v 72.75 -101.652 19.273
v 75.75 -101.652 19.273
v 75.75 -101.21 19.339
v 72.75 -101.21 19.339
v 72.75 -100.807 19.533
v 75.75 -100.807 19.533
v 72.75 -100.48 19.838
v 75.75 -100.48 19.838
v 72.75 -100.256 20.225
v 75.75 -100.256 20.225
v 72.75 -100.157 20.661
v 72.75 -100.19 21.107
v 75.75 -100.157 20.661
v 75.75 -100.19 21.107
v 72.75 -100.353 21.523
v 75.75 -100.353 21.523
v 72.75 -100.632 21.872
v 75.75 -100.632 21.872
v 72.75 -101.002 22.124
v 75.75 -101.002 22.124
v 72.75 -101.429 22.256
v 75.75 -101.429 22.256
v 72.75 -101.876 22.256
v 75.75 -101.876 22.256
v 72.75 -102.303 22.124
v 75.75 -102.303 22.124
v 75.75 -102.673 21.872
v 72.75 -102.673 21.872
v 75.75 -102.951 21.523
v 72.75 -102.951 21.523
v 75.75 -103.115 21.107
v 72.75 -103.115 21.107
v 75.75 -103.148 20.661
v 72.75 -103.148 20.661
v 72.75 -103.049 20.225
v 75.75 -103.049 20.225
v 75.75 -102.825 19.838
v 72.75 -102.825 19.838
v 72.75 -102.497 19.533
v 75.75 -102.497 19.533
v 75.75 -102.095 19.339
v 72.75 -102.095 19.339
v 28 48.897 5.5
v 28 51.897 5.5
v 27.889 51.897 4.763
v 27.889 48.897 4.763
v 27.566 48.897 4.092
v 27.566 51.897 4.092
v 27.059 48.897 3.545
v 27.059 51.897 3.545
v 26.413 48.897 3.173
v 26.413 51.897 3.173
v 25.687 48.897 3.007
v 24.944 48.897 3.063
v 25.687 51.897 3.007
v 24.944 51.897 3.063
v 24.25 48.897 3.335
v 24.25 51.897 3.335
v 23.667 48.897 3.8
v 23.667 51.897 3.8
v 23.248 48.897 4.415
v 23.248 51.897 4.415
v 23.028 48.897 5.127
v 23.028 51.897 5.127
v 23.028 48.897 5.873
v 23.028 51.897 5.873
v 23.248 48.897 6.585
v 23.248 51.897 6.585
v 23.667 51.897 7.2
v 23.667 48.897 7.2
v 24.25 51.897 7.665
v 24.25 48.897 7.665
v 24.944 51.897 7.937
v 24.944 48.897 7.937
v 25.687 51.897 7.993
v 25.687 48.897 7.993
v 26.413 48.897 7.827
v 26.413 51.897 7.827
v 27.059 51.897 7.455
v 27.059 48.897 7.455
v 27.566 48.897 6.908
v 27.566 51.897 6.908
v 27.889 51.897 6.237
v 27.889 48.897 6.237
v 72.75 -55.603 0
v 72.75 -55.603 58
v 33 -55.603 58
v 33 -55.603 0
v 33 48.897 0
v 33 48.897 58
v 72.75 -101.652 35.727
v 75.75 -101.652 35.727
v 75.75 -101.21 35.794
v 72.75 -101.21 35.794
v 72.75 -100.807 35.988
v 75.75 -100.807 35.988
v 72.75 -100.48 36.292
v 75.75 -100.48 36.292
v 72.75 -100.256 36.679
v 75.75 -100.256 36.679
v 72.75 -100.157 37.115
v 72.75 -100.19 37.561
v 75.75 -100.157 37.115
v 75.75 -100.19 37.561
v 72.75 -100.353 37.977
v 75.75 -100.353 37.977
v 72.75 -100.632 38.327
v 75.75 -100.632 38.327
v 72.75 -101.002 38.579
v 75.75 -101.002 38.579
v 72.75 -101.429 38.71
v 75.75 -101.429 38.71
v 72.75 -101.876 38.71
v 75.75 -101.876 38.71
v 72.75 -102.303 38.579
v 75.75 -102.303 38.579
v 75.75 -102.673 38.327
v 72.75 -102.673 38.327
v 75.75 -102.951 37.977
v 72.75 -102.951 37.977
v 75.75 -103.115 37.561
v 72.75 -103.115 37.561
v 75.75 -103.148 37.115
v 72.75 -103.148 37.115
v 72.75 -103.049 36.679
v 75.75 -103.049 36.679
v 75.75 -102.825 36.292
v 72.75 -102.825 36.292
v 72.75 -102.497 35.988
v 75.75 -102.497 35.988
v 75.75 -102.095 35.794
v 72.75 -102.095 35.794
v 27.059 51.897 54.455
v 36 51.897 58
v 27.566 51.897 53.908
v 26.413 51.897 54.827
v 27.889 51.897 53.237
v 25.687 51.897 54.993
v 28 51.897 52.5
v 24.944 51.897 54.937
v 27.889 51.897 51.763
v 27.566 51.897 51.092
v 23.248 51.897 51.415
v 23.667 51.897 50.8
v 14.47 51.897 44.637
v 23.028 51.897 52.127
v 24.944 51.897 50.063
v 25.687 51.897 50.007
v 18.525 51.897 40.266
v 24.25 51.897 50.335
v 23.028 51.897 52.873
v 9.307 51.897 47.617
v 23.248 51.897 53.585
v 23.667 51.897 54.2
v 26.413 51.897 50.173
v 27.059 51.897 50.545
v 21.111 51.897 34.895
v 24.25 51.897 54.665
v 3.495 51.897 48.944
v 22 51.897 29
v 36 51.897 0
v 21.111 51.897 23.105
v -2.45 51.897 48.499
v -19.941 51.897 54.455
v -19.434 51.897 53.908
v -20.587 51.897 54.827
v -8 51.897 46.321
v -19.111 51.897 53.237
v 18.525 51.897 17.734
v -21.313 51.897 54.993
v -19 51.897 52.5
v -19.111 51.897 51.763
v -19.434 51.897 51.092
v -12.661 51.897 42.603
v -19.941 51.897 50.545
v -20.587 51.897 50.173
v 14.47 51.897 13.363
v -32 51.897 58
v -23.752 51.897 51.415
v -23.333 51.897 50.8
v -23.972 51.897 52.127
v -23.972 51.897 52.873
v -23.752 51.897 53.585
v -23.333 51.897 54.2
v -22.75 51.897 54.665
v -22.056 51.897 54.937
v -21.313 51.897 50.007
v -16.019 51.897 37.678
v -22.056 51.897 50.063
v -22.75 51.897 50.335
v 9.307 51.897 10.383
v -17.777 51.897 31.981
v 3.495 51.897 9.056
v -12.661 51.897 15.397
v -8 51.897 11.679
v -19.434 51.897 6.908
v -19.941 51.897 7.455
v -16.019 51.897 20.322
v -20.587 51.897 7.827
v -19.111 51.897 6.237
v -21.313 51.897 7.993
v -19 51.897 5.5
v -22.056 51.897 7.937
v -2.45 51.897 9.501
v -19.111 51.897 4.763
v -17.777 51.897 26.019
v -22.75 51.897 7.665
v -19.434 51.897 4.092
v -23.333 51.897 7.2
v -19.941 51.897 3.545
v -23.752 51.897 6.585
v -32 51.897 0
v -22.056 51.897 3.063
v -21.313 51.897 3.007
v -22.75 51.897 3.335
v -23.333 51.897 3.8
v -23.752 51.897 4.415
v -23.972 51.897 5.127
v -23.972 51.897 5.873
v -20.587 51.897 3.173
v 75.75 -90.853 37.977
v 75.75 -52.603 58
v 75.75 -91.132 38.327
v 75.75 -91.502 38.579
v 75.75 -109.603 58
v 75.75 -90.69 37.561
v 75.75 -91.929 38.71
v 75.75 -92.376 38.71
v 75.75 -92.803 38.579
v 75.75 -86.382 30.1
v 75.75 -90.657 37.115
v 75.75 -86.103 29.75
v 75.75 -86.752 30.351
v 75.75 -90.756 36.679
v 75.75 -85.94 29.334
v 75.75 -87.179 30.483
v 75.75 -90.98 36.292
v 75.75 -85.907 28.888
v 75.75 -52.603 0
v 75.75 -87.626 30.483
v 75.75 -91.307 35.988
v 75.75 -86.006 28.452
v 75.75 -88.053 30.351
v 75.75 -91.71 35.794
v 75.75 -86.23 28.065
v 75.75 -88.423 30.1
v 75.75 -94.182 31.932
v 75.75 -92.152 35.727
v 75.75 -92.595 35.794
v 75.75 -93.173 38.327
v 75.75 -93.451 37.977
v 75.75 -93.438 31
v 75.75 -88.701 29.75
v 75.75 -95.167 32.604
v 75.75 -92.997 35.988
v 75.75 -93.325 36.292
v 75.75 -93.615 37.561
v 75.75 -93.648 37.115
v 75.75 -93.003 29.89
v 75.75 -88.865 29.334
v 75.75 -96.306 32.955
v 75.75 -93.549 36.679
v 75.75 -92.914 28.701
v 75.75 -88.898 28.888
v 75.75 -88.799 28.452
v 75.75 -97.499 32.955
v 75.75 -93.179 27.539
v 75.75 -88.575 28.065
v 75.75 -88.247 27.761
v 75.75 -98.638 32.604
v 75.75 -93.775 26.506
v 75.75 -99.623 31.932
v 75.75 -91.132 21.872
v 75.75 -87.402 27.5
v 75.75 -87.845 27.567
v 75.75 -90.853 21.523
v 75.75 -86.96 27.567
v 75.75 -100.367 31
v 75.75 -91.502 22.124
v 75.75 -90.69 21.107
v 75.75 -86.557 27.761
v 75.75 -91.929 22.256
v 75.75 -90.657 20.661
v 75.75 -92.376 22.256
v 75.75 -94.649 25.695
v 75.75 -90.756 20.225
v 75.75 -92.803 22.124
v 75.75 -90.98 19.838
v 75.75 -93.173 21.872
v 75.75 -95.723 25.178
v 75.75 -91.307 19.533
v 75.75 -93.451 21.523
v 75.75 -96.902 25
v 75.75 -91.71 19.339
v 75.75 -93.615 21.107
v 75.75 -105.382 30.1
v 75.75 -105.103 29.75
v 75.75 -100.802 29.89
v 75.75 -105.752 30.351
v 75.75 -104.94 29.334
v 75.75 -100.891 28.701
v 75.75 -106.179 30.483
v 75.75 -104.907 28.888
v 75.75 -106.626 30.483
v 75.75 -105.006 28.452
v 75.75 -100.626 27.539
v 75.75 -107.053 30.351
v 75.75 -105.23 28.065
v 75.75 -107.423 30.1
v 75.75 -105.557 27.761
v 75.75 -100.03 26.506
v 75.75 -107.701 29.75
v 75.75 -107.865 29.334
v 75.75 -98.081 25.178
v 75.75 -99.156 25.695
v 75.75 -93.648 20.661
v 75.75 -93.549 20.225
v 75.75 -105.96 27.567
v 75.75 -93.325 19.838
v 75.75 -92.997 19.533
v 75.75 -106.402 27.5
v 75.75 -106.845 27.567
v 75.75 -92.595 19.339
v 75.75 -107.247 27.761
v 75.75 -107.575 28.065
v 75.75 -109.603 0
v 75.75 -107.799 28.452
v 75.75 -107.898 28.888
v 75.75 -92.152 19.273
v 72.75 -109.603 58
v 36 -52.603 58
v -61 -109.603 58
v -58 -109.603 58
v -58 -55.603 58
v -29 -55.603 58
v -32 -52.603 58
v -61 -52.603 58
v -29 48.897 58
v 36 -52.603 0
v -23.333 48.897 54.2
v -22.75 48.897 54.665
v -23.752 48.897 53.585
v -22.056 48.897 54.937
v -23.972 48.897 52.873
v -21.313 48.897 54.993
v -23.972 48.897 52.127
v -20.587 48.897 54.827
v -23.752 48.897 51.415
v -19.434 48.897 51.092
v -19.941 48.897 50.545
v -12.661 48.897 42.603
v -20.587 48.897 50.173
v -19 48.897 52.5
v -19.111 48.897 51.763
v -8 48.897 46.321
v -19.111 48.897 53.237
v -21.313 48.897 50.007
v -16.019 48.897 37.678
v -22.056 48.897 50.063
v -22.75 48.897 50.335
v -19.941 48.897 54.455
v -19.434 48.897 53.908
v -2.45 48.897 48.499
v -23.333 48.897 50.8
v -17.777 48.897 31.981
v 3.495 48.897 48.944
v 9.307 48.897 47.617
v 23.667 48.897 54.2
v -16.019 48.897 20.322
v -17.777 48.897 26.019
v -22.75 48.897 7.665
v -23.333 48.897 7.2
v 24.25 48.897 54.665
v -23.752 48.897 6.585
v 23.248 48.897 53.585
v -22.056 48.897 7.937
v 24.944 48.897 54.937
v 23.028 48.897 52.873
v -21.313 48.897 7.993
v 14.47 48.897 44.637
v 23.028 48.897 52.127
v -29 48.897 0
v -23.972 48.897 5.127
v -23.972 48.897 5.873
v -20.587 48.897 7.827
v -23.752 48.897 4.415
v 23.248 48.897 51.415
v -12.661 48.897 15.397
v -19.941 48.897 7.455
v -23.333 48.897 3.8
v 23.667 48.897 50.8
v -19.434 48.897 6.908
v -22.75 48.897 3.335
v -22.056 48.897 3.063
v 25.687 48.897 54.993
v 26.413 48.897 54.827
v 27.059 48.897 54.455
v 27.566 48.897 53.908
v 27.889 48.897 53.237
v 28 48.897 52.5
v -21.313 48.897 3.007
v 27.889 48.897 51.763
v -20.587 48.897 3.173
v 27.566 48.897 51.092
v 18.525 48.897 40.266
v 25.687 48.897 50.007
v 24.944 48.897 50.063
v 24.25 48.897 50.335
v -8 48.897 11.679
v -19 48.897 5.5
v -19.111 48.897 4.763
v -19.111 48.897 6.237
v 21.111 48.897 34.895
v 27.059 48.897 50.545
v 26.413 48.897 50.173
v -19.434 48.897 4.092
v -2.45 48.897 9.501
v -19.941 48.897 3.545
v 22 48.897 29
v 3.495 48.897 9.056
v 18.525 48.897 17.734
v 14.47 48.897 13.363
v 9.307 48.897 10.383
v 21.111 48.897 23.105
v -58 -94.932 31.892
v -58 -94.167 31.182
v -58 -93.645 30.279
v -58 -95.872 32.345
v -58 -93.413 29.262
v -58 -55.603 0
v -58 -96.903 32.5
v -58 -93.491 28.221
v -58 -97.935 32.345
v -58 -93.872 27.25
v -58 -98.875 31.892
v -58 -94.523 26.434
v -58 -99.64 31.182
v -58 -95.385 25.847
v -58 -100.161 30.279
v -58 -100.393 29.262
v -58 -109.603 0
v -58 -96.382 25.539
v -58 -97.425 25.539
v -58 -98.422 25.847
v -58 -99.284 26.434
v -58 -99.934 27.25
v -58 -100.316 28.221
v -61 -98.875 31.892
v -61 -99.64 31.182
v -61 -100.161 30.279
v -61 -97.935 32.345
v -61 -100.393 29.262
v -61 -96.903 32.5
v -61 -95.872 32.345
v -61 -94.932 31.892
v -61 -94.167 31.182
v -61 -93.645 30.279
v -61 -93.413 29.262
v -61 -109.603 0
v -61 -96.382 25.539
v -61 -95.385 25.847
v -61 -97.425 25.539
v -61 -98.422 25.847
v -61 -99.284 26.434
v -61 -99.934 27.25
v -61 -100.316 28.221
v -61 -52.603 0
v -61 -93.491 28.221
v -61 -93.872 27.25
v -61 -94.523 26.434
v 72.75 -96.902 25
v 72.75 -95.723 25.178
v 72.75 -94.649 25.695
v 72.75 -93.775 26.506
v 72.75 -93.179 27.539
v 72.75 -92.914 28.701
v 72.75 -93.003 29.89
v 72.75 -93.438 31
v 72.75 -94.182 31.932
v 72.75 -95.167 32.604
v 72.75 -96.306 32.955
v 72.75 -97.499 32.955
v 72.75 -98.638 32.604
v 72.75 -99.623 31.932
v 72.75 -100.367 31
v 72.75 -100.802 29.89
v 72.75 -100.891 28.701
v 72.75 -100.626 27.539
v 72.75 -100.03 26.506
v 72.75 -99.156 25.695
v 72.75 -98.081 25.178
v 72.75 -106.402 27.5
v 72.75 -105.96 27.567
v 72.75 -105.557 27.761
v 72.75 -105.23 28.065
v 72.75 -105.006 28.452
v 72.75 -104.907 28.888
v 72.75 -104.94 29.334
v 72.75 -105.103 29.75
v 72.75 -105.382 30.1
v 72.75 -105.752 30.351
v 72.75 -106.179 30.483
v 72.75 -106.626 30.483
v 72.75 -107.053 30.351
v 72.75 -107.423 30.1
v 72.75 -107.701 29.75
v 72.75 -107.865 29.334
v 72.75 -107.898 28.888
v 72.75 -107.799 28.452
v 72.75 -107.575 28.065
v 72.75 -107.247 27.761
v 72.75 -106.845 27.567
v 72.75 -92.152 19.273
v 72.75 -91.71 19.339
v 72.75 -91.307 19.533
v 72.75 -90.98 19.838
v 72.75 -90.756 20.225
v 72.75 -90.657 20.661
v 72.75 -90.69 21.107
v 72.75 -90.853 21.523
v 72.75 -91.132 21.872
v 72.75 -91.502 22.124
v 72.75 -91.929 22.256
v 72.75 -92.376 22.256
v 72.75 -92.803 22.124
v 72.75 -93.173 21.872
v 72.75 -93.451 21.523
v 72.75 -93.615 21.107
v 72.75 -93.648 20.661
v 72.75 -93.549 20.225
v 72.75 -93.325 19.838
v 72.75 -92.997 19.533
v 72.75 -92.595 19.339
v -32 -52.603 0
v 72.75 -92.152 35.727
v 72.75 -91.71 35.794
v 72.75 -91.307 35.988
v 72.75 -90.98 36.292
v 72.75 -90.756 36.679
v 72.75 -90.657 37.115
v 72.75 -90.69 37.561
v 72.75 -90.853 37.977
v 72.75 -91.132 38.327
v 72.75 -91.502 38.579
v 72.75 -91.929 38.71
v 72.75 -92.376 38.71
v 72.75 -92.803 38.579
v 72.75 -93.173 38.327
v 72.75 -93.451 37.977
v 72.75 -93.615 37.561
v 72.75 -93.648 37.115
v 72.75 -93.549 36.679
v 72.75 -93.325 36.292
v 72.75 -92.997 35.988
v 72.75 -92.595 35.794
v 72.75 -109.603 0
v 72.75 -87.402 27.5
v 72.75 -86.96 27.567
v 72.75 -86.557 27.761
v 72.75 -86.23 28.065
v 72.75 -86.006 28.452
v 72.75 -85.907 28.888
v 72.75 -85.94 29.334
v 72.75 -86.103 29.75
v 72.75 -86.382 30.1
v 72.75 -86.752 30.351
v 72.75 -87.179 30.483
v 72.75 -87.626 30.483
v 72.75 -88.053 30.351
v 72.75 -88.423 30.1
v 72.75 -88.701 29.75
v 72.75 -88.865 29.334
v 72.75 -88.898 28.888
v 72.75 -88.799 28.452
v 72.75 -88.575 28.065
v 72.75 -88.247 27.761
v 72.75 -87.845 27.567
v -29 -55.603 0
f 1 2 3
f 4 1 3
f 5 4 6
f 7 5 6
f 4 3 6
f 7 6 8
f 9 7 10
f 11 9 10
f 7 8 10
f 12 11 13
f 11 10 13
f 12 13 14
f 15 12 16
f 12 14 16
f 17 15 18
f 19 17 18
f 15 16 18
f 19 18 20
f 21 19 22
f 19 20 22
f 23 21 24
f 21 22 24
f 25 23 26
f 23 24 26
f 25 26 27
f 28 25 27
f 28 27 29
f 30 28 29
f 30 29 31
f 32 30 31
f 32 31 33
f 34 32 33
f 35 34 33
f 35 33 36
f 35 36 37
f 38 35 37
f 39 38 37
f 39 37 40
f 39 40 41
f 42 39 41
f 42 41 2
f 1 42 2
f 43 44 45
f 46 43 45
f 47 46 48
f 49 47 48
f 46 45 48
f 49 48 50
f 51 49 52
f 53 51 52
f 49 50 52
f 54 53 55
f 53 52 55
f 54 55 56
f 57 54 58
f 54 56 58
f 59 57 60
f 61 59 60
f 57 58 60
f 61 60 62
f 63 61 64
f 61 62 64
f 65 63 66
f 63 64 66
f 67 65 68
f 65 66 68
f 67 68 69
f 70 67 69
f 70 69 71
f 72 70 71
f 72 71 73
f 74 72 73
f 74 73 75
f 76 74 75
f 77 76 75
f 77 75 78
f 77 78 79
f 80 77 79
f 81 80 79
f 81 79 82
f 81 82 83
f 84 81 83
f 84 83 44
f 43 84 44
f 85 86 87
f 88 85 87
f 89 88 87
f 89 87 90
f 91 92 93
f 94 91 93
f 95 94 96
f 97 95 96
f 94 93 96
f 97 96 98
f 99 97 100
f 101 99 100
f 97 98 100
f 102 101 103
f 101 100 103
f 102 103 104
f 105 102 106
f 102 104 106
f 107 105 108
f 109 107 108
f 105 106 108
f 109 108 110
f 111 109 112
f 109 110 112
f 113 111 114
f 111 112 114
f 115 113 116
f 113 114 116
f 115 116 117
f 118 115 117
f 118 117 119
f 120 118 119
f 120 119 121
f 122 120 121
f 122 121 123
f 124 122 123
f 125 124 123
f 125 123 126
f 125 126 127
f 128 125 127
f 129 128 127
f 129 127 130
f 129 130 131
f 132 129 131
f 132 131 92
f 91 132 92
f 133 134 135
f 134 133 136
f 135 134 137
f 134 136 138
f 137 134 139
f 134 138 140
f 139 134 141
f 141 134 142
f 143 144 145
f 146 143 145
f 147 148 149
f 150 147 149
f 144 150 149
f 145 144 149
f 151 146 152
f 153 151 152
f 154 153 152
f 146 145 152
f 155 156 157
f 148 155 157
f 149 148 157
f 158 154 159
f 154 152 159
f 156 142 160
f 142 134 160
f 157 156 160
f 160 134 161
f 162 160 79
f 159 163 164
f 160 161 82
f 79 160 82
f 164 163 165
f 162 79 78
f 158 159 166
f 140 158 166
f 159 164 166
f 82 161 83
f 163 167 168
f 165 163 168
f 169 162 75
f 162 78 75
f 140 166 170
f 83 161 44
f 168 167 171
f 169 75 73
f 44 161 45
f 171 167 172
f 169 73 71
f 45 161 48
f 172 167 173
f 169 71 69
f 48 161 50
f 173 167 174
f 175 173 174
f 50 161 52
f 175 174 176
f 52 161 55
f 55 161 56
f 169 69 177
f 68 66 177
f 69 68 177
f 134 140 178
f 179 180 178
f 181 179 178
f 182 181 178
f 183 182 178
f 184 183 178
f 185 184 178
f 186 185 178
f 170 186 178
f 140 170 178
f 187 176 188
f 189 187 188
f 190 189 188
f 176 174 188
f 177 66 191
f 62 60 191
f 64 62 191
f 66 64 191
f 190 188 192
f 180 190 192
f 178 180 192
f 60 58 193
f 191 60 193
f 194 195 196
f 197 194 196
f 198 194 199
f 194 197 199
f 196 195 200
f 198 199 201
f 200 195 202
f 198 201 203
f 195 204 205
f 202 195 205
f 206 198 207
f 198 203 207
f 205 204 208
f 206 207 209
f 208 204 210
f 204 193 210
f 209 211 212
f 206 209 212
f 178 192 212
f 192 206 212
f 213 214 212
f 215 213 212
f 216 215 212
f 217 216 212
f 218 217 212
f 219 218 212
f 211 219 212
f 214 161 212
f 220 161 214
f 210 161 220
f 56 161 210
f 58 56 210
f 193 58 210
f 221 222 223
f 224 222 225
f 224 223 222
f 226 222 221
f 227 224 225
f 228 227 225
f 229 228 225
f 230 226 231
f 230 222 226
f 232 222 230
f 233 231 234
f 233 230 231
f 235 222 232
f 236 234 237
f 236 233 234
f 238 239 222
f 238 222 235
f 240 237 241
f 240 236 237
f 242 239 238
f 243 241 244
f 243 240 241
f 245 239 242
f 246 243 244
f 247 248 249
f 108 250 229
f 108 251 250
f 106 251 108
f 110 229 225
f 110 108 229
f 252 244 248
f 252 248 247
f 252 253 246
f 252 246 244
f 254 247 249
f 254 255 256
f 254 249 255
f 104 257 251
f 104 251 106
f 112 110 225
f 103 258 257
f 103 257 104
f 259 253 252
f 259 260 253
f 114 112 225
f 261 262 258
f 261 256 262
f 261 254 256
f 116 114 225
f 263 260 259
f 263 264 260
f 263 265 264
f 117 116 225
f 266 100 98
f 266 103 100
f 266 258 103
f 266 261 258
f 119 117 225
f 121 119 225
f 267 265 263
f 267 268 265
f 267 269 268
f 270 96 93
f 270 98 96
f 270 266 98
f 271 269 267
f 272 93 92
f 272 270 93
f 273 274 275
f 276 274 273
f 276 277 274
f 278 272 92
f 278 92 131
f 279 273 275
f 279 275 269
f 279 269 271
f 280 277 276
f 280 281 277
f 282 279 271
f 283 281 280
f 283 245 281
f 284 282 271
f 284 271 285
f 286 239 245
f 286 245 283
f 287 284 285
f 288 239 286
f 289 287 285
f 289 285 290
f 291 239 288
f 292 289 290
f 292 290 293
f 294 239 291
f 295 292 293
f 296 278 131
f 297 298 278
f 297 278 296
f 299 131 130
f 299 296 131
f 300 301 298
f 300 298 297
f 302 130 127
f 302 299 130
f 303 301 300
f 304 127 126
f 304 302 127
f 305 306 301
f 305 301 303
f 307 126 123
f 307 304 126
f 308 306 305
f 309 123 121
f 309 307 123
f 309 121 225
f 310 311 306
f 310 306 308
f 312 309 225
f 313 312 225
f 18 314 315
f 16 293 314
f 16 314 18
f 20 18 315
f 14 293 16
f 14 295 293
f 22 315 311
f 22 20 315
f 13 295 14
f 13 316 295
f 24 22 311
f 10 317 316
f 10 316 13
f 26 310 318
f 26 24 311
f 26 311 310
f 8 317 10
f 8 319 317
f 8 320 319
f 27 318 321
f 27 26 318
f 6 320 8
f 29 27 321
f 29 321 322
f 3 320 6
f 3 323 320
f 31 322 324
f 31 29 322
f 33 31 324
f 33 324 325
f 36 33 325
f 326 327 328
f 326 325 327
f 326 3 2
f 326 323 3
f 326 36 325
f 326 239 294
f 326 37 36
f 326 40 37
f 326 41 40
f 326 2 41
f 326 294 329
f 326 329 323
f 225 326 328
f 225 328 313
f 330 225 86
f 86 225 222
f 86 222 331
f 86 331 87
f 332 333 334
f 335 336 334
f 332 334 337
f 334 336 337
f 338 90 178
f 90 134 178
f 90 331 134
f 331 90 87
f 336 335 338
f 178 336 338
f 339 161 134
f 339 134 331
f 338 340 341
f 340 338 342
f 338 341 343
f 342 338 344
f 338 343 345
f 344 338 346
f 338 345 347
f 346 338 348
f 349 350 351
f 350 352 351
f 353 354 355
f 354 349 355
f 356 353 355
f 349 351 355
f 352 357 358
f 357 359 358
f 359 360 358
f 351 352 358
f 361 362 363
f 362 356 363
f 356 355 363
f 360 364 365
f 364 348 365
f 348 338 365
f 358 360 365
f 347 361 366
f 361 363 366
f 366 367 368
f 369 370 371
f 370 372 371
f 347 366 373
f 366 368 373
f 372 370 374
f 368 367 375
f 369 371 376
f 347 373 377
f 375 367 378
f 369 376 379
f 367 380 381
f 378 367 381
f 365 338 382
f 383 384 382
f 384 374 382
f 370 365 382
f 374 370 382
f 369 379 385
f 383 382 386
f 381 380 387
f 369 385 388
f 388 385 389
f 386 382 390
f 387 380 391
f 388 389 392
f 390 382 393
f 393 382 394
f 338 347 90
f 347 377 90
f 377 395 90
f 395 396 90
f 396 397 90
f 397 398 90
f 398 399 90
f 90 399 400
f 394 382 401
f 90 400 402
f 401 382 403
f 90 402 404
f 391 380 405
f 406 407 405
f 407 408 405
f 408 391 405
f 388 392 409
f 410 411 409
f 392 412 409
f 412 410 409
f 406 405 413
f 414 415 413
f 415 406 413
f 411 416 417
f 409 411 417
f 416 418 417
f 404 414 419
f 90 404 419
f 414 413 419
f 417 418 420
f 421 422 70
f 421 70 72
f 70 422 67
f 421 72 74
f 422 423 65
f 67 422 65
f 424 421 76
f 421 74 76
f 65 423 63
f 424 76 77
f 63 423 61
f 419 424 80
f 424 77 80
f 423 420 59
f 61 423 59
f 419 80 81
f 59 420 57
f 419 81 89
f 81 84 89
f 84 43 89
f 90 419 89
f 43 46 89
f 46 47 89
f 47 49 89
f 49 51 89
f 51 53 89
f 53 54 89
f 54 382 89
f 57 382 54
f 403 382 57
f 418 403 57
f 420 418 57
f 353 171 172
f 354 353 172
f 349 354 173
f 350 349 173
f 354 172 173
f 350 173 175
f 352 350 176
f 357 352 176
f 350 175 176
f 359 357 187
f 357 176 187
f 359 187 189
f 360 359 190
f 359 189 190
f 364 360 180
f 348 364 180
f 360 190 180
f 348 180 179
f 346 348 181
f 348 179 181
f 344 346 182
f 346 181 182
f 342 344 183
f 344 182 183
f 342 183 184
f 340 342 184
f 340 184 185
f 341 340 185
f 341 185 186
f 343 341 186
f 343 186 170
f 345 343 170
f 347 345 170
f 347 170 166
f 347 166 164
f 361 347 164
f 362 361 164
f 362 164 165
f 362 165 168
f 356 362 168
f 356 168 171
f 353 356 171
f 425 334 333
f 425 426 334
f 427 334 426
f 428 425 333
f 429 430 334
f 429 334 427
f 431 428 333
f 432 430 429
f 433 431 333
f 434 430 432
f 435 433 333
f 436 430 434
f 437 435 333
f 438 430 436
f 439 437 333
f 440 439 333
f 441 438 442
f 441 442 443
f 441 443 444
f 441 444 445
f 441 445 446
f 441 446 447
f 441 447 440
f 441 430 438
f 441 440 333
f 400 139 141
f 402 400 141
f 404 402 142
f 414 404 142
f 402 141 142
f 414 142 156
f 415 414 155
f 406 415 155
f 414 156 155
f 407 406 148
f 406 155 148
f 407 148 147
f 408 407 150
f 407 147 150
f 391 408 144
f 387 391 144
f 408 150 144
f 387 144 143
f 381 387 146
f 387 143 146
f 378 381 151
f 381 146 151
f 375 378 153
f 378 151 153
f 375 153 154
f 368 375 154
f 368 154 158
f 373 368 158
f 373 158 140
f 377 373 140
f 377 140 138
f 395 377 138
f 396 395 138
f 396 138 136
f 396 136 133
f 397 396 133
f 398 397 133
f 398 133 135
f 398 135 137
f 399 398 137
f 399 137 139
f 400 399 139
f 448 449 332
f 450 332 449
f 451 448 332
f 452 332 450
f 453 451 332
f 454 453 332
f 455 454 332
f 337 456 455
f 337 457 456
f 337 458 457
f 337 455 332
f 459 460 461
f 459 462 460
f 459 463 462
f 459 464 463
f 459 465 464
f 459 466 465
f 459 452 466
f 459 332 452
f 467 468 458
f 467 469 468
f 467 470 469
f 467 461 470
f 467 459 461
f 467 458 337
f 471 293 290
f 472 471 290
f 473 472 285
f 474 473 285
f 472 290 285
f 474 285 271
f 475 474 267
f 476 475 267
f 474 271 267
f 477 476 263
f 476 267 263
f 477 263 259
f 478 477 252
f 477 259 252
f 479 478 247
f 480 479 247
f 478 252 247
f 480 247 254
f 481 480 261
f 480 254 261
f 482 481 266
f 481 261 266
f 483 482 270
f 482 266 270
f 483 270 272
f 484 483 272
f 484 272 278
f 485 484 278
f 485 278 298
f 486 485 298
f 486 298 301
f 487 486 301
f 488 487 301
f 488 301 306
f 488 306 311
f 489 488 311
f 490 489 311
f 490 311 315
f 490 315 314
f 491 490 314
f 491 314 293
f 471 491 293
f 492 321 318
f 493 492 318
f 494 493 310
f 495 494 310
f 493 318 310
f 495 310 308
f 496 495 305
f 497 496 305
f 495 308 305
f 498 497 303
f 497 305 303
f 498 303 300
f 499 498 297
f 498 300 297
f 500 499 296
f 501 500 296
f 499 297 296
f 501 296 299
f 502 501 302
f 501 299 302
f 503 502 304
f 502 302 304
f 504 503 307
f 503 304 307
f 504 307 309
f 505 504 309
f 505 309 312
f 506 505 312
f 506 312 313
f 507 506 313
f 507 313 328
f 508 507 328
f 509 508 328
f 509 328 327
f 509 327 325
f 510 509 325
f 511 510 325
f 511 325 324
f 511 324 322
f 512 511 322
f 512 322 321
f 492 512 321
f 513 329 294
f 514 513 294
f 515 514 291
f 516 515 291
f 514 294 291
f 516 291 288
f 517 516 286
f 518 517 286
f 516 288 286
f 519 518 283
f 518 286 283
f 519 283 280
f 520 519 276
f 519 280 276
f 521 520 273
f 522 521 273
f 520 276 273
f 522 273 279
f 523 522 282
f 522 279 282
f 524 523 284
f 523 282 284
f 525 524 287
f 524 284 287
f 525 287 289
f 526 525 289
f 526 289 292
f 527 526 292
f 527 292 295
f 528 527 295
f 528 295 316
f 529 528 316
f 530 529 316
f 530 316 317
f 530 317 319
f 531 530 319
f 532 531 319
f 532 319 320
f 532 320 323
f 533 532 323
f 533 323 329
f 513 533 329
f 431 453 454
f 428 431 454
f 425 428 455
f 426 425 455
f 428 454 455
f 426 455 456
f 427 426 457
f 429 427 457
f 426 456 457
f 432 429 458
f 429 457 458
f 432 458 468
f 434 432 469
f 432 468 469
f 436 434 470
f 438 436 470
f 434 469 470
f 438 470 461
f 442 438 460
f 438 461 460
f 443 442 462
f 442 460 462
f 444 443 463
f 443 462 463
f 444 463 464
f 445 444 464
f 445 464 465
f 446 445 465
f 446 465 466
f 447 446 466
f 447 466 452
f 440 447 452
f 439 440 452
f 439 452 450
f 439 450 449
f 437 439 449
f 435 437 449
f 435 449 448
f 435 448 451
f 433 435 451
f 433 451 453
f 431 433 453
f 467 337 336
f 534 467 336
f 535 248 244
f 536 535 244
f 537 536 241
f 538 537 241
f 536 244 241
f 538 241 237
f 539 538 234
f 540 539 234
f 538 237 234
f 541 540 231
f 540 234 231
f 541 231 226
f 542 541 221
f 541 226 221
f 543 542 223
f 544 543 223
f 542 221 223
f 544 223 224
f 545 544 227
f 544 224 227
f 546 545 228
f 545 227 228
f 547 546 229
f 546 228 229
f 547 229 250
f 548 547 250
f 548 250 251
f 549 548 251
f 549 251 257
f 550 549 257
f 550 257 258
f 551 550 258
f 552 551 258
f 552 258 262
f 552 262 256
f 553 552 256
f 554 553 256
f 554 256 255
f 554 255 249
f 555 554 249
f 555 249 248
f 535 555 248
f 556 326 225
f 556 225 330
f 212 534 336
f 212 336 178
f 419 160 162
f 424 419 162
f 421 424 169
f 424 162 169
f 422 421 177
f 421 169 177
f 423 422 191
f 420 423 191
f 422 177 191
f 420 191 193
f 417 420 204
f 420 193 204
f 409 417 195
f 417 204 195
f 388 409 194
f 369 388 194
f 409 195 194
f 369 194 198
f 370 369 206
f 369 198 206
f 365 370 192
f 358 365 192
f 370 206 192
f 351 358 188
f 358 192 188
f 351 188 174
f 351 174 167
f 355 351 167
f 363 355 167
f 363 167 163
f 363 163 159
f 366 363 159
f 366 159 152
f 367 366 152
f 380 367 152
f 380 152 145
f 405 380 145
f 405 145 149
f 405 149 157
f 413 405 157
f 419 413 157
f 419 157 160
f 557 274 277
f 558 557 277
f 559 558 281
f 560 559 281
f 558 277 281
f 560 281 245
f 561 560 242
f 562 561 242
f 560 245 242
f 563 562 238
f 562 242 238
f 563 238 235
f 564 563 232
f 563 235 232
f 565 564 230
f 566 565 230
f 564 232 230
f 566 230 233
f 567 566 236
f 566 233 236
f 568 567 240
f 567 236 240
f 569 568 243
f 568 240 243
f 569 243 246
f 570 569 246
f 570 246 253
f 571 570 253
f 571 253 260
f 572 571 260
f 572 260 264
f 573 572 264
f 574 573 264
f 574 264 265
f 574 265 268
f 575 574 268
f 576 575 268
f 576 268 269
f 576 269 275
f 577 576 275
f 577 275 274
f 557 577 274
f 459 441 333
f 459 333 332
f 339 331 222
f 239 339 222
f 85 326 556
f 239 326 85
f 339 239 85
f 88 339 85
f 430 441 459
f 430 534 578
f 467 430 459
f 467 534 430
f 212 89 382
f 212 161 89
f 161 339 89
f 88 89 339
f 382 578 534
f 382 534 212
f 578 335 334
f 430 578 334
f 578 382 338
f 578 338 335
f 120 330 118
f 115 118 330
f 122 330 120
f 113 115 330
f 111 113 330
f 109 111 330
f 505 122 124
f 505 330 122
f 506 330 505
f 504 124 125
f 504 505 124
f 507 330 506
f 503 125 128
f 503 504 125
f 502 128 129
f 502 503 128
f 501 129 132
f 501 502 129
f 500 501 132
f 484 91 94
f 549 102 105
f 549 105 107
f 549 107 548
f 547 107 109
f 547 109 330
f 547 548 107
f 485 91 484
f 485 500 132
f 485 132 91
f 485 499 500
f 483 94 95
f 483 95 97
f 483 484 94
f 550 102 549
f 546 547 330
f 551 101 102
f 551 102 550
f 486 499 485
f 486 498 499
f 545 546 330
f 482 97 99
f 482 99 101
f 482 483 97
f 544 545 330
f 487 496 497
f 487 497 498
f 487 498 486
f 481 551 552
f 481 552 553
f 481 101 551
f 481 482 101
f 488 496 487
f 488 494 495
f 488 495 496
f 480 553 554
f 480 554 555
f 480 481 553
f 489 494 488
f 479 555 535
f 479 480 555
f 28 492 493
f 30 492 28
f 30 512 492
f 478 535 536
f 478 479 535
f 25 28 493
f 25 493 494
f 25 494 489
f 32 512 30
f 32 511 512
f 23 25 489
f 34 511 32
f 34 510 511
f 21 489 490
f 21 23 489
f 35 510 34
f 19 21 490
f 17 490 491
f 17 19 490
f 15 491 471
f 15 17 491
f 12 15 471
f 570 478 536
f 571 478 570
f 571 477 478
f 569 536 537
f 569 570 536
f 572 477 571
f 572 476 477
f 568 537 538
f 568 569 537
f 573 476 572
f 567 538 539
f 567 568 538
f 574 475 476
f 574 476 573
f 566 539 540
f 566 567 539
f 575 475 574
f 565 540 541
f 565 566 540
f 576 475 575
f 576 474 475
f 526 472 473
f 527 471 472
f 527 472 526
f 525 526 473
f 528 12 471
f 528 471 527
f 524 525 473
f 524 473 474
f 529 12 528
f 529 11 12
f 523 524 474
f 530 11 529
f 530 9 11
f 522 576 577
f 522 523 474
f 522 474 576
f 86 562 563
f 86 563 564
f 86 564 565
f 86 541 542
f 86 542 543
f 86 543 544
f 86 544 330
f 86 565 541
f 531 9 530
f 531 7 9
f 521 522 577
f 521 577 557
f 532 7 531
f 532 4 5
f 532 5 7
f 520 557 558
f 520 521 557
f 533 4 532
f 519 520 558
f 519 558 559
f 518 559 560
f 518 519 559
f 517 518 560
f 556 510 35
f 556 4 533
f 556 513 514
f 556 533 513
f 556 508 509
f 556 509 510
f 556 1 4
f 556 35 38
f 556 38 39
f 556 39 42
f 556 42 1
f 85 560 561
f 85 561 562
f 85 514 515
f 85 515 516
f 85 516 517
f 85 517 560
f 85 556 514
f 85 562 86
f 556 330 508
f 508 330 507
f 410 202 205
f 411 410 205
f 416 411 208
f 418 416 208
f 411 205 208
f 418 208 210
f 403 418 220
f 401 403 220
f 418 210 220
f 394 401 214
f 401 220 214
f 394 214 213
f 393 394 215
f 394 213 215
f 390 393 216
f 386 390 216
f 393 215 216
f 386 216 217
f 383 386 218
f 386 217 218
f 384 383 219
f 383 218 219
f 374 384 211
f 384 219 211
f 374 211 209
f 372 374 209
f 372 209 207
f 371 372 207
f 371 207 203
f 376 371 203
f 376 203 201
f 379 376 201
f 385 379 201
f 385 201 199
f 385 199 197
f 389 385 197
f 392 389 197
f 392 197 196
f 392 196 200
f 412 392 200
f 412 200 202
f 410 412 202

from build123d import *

# Parameters (mm, degrees)
BOSS_EXTRUDE1_DEPTH = 58
SKETCH5_R           = 3.5
CUT_EXTRUDE3_DEPTH  = 58
SKETCH15_R          = 4
CUT_EXTRUDE4_DEPTH  = 10
SKETCH16_R          = 1.5
CUT_EXTRUDE5_DEPTH  = 10
SKETCH17_R          = 20
SKETCH17_R_2        = 2.5
CUT_EXTRUDE6_DEPTH  = 10


with BuildPart() as part:
    # Sketch2 → Boss-Extrude1 (new body)
    with BuildSketch(Plane.XY):
        Polygon((2, 51.896715462), (36, 51.896715462), (36, -52.603284538), (75.75, -52.603284538), (75.75, -109.603284538), (72.75, -109.603284538), (72.75, -55.603284538), (33, -55.603284538), (33, 48.896715462), (2, 48.896715462), (-29, 48.896715462), (-29, -55.603284538), (-58, -55.603284538), (-58, -109.603284538), (-61, -109.603284538), (-61, -52.603284538), (-32, -52.603284538), (-32, 51.896715462), align=None)
    extrude(amount=BOSS_EXTRUDE1_DEPTH)

    # Sketch5 → Cut-Extrude3 (cut)
    with BuildSketch(Plane.ZY.offset(61)):
        with Locations((29, -96.903284538)):
            Circle(SKETCH5_R)
    extrude(amount=-CUT_EXTRUDE3_DEPTH, mode=Mode.SUBTRACT)

    # Sketch15 → Cut-Extrude4 (cut)
    with BuildSketch(Plane(origin=(75.75, 0, 0), x_dir=(0, 0, -1), z_dir=(1, 0, 0))):
        with Locations((-29, -96.902439923)):
            Circle(SKETCH15_R)
    extrude(amount=-CUT_EXTRUDE4_DEPTH, mode=Mode.SUBTRACT)

    # Sketch16 → Cut-Extrude5 (cut)
    with BuildSketch(Plane(origin=(75.75, 0, 0), x_dir=(0, 0, -1), z_dir=(1, 0, 0))):
        with Locations((-29, -87.402439923)):
            Circle(SKETCH16_R)
        with Locations((-20.772758664, -92.152439923)):
            Circle(SKETCH16_R)
        with Locations((-20.772758664, -101.652439923)):
            Circle(SKETCH16_R)
        with Locations((-29, -106.402439923)):
            Circle(SKETCH16_R)
        with Locations((-37.227241336, -101.652439923)):
            Circle(SKETCH16_R)
        with Locations((-37.227241336, -92.152439923)):
            Circle(SKETCH16_R)
    extrude(amount=-CUT_EXTRUDE5_DEPTH, mode=Mode.SUBTRACT)

    # Sketch17 → Cut-Extrude6 (cut)
    with BuildSketch(Plane(origin=(0, 51.896715462, 0), x_dir=(1, 0, 0), z_dir=(0, 1, 0))):
        with Locations((2, -29)):
            Circle(SKETCH17_R)
        with Locations((-21.5, -5.5)):
            Circle(SKETCH17_R_2)
        with Locations((25.5, -5.5)):
            Circle(SKETCH17_R_2)
        with Locations((25.5, -52.5)):
            Circle(SKETCH17_R_2)
        with Locations((-21.5, -52.5)):
            Circle(SKETCH17_R_2)
    extrude(amount=-CUT_EXTRUDE6_DEPTH, mode=Mode.SUBTRACT)


solid = part.part
